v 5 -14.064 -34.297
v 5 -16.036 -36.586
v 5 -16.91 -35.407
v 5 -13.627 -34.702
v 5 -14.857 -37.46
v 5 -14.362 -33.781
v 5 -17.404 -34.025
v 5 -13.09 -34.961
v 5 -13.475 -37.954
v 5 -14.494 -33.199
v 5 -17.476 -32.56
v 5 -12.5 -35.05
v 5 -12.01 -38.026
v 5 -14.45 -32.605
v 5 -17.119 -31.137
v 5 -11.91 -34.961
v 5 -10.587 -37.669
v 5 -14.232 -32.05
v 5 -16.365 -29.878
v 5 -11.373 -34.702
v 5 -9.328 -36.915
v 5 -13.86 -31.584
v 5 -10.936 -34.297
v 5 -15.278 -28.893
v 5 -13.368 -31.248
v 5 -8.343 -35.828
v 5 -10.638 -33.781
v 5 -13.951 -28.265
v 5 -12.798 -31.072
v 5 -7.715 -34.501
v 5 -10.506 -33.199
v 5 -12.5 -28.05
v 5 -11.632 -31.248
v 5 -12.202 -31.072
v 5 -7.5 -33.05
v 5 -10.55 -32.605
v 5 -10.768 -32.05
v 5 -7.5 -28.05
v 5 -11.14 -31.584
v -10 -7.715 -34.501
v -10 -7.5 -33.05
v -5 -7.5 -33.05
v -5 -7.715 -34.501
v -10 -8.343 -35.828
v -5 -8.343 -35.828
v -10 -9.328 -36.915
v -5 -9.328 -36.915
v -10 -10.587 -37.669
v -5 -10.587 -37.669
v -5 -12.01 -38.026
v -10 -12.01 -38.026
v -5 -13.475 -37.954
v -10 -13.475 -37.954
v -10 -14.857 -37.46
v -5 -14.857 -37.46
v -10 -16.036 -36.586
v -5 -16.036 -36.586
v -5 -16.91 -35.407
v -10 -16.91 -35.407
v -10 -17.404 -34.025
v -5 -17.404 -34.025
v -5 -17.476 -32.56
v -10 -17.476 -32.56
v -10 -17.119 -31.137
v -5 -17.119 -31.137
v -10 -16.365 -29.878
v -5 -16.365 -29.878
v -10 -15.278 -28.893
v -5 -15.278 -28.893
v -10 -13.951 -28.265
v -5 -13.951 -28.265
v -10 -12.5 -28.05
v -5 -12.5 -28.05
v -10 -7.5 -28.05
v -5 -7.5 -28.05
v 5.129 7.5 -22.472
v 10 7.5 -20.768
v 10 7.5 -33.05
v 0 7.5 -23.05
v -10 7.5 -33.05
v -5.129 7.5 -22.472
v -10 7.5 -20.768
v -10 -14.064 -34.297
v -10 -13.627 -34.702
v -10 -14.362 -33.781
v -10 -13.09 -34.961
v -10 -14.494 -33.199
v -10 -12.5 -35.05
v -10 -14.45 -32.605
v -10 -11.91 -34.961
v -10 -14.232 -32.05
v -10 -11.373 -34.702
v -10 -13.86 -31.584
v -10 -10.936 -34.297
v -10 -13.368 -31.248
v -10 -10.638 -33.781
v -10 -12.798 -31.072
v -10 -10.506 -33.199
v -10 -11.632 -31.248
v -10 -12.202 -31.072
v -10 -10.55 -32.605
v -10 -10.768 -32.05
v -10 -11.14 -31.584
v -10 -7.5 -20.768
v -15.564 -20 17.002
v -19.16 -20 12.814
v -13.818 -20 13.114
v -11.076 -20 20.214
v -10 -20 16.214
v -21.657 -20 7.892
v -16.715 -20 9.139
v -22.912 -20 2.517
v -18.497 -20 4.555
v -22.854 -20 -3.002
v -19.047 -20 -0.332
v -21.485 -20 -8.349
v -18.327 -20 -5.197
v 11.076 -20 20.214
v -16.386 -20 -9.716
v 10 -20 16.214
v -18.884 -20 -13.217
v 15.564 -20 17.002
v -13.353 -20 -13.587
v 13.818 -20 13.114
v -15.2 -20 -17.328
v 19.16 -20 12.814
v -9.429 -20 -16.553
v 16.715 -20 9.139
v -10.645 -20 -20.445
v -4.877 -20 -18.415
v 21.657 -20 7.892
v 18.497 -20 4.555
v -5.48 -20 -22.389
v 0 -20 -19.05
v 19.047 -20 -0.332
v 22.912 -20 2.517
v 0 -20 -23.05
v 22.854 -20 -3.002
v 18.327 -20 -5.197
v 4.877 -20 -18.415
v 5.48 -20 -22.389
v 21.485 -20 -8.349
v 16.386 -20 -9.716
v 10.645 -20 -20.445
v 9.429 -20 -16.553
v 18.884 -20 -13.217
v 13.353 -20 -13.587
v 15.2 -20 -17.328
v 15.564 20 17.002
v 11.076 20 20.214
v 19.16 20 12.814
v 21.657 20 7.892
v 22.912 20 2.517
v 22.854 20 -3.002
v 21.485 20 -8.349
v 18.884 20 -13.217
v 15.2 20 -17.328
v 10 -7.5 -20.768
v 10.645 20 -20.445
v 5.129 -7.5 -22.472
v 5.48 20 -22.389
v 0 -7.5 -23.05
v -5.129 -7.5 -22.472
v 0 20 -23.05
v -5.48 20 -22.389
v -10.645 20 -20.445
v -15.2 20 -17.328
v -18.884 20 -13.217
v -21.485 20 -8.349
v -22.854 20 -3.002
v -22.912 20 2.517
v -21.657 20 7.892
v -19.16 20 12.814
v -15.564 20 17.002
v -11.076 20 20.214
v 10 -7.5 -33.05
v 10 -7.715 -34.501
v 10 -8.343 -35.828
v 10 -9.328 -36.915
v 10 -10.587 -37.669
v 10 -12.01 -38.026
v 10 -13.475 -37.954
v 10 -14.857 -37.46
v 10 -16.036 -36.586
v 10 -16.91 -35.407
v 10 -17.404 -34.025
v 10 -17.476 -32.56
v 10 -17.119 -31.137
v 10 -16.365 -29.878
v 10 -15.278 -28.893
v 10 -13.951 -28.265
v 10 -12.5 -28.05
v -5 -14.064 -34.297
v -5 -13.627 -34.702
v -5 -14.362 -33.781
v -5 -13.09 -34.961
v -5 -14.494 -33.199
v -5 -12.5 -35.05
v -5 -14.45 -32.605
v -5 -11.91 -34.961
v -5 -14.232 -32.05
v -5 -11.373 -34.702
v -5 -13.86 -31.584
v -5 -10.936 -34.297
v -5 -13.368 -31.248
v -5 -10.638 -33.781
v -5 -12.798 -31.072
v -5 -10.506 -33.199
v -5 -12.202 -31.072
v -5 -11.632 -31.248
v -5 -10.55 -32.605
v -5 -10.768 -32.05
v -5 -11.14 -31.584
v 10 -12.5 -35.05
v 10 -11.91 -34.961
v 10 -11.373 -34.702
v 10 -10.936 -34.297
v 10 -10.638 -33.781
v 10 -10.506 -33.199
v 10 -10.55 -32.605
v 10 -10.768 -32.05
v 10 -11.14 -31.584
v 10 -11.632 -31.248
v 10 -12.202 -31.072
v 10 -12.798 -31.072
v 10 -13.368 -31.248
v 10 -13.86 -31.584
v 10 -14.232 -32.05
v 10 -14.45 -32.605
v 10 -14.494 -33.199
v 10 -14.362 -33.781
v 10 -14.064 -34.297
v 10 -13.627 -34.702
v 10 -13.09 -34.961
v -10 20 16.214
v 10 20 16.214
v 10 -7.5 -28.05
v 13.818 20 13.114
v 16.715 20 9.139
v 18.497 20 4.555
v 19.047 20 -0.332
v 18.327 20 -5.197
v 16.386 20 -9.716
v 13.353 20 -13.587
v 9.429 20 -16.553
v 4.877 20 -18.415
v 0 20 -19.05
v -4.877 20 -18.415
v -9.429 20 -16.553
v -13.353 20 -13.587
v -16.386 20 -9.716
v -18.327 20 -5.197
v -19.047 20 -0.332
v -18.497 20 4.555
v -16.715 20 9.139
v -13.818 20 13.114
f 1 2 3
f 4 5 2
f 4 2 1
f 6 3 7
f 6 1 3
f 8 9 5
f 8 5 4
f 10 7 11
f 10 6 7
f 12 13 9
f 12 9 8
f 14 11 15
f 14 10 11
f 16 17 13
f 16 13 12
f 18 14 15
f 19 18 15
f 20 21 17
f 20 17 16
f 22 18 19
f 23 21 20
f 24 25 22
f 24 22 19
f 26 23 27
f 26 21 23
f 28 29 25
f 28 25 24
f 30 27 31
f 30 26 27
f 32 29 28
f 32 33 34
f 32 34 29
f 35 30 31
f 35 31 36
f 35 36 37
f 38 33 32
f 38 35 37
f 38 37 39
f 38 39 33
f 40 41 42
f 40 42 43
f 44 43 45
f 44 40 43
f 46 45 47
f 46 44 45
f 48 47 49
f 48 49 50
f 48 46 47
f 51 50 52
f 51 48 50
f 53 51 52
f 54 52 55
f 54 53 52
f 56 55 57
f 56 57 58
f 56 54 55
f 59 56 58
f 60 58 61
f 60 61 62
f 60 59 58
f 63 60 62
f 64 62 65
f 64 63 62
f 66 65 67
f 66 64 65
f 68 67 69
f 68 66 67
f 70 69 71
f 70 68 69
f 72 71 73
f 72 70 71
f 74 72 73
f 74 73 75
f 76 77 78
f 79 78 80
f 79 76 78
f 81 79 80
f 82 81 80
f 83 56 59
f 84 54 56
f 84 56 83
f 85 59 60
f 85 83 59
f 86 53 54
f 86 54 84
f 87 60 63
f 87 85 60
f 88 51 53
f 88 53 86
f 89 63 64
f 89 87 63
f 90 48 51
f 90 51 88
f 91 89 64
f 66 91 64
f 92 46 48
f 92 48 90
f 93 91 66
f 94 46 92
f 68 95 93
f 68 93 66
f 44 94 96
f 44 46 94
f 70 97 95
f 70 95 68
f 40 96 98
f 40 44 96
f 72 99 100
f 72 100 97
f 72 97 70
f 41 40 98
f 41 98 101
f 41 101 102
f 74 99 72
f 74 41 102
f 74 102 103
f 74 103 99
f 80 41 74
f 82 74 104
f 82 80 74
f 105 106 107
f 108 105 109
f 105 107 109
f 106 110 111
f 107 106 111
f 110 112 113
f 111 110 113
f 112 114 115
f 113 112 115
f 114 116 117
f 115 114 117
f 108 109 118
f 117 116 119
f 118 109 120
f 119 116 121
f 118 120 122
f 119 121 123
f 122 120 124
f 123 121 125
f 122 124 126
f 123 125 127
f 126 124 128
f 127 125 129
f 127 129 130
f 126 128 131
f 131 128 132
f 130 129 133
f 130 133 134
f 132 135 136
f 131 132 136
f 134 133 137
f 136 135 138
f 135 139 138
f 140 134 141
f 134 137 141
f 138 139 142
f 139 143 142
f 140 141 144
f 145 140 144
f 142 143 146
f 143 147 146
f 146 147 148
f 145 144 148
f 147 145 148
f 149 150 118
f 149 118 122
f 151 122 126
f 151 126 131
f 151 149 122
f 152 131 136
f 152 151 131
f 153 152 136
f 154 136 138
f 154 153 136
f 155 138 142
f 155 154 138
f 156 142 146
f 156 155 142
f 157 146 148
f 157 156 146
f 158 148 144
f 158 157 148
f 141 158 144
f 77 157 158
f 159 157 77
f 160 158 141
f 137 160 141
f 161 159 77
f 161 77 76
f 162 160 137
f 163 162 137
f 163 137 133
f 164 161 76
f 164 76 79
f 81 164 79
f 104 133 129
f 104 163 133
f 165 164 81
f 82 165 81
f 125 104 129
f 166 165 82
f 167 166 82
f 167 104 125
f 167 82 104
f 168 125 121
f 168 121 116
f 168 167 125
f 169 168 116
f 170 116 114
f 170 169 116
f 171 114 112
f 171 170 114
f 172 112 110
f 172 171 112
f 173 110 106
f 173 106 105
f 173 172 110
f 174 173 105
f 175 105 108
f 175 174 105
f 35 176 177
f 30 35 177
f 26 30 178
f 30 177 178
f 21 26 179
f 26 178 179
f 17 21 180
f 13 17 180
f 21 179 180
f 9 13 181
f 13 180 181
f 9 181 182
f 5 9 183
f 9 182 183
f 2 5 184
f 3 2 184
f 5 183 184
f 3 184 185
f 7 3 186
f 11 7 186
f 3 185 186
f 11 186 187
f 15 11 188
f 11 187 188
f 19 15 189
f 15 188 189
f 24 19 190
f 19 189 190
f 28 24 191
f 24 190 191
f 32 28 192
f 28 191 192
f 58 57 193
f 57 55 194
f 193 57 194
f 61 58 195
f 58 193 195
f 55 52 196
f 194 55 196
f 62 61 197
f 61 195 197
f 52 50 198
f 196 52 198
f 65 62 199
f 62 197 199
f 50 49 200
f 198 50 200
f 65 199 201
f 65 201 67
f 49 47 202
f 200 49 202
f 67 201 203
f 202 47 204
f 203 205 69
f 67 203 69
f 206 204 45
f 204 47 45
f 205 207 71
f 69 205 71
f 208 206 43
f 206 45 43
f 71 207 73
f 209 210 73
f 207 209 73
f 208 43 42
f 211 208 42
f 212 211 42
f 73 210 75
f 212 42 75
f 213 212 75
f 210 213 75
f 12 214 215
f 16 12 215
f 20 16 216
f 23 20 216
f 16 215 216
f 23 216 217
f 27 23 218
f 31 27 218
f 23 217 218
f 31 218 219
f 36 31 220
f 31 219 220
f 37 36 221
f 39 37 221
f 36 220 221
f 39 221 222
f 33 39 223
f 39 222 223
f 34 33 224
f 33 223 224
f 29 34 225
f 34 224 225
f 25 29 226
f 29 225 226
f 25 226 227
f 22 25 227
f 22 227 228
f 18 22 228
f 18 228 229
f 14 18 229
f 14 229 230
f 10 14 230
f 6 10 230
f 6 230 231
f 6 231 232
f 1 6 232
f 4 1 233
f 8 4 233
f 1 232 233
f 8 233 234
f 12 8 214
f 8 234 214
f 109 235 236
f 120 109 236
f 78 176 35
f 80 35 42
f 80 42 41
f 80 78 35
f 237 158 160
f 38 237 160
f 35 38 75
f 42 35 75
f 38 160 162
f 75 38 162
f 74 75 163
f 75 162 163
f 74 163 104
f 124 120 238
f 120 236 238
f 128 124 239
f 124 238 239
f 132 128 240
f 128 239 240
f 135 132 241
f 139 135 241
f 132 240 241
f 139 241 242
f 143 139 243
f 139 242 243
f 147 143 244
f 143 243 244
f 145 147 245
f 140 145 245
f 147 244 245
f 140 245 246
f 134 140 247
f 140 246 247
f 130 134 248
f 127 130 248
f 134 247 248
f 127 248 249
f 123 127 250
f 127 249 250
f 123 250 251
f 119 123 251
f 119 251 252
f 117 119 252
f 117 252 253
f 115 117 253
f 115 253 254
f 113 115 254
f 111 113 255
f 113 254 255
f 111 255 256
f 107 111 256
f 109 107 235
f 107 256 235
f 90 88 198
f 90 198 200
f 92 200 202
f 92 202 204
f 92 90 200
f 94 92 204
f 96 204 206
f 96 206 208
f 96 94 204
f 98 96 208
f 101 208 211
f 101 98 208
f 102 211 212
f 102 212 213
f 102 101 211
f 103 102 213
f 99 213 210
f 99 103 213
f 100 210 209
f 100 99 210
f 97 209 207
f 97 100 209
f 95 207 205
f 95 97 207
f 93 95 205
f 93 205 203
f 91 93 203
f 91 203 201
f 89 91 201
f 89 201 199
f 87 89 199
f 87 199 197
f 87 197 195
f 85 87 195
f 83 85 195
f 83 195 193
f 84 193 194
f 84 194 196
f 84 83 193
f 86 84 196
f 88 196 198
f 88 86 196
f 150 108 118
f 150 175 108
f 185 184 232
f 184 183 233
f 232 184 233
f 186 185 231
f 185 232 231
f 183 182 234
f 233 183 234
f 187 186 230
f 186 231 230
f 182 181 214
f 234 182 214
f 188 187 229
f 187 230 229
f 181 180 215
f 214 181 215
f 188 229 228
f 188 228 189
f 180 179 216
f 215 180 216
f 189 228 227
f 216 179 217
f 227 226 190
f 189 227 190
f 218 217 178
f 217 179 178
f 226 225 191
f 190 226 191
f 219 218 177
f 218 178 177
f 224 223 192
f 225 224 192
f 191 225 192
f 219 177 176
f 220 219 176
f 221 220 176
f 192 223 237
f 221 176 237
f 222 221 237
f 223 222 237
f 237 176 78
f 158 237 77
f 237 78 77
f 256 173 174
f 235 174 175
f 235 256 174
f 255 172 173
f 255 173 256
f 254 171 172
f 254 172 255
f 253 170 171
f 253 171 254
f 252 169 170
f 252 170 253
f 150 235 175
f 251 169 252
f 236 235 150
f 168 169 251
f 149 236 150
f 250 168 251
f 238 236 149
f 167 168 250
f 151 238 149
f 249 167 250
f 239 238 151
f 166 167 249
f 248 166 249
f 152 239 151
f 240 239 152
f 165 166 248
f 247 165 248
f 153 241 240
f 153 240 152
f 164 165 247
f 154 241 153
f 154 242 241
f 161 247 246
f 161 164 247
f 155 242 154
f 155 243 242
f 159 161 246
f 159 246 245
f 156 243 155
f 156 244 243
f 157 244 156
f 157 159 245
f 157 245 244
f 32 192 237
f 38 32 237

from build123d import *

# Parameters (mm, degrees)
BOSS_EXTRUDE1_DEPTH             = 20
BOSS_EXTRUDE2_REACH             = 54.944
BOSS_EXTRUDE2_END_RADIUS        = 23.05
SKETCH2_W                       = 20
SKETCH2_H                       = 15
BOSS_EXTRUDE2_DIRECTION_2_DEPTH = 10
SKETCH3_R                       = 2
BOSS_EXTRUDE3_DEPTH             = 5


with BuildPart() as part:
    # Sketch1 → Boss-Extrude1 (new, symmetric)
    with BuildSketch(Plane(origin=(0, 0, 0), x_dir=(1, 0, 0), z_dir=(0, 1, 0))):
        with BuildLine():
            Line((-11.076364599, -20.214268408), (11.076364599, -20.214268408))
            ThreePointArc((11.076364599, -20.214268408), (0, 23.05), (-11.076364599, -20.214268408))
        make_face()
        with BuildLine():
            Line((-10, -16.214268408), (10, -16.214268408))
            ThreePointArc((10, -16.214268408), (0, 19.05), (-10, -16.214268408))
        make_face(mode=Mode.SUBTRACT)
    extrude(amount=BOSS_EXTRUDE1_DEPTH, both=True)

    # Boss-Extrude2: up to this cylinder (the profile starts outside it)
    boss_extrude2_end = Plane(origin=(0, 0, 0), z_dir=(0, -1, 0)) * Cylinder(BOSS_EXTRUDE2_END_RADIUS, 156.988, mode=Mode.PRIVATE)
    # Sketch2 → Boss-Extrude2 (add, up to the surface)
    with BuildSketch(Plane(origin=(0, 0, -23.05), x_dir=(-1, 0, 0), z_dir=(0, 0, -1)), mode=Mode.PRIVATE) as boss_extrude2_sk1:
        Rectangle(SKETCH2_W, SKETCH2_H)
    boss_extrude2_tool1 = extrude(boss_extrude2_sk1.sketch, amount=-BOSS_EXTRUDE2_REACH, mode=Mode.PRIVATE) - boss_extrude2_end
    add(boss_extrude2_tool1.solids().sort_by_distance((0, 0, -23.05))[0])
    add(boss_extrude2_tool1.solids().sort_by_distance((0, 0, -23.05))[1])

    # Sketch2 → Boss-Extrude2 direction 2 (add)
    with BuildSketch(Plane(origin=(0, 0, -23.05), x_dir=(-1, 0, 0), z_dir=(0, 0, -1))):
        Rectangle(SKETCH2_W, SKETCH2_H)
    extrude(amount=BOSS_EXTRUDE2_DIRECTION_2_DEPTH)

    # Sketch3 → Boss-Extrude3 (add)
    with BuildSketch(Plane(origin=(10, 0, 0), x_dir=(0, 0, -1), z_dir=(1, 0, 0))):
        with BuildLine():
            Line((28.05, -12.5), (28.05, -7.5))
            Line((28.05, -7.5), (33.05, -7.5))
            ThreePointArc((33.05, -7.5), (36.585533906, -16.035533906), (28.05, -12.5))
        make_face()
        with Locations((33.05, -12.5)):
            Circle(SKETCH3_R, mode=Mode.SUBTRACT)
    boss_extrude3 = extrude(amount=-BOSS_EXTRUDE3_DEPTH)

    # Mirror1: Boss-Extrude3 across plane
    add(boss_extrude3.mirror(Plane(origin=(0, 0, 0), x_dir=(0, 0, 1), z_dir=(1, 0, 0))))


solid = part.part
